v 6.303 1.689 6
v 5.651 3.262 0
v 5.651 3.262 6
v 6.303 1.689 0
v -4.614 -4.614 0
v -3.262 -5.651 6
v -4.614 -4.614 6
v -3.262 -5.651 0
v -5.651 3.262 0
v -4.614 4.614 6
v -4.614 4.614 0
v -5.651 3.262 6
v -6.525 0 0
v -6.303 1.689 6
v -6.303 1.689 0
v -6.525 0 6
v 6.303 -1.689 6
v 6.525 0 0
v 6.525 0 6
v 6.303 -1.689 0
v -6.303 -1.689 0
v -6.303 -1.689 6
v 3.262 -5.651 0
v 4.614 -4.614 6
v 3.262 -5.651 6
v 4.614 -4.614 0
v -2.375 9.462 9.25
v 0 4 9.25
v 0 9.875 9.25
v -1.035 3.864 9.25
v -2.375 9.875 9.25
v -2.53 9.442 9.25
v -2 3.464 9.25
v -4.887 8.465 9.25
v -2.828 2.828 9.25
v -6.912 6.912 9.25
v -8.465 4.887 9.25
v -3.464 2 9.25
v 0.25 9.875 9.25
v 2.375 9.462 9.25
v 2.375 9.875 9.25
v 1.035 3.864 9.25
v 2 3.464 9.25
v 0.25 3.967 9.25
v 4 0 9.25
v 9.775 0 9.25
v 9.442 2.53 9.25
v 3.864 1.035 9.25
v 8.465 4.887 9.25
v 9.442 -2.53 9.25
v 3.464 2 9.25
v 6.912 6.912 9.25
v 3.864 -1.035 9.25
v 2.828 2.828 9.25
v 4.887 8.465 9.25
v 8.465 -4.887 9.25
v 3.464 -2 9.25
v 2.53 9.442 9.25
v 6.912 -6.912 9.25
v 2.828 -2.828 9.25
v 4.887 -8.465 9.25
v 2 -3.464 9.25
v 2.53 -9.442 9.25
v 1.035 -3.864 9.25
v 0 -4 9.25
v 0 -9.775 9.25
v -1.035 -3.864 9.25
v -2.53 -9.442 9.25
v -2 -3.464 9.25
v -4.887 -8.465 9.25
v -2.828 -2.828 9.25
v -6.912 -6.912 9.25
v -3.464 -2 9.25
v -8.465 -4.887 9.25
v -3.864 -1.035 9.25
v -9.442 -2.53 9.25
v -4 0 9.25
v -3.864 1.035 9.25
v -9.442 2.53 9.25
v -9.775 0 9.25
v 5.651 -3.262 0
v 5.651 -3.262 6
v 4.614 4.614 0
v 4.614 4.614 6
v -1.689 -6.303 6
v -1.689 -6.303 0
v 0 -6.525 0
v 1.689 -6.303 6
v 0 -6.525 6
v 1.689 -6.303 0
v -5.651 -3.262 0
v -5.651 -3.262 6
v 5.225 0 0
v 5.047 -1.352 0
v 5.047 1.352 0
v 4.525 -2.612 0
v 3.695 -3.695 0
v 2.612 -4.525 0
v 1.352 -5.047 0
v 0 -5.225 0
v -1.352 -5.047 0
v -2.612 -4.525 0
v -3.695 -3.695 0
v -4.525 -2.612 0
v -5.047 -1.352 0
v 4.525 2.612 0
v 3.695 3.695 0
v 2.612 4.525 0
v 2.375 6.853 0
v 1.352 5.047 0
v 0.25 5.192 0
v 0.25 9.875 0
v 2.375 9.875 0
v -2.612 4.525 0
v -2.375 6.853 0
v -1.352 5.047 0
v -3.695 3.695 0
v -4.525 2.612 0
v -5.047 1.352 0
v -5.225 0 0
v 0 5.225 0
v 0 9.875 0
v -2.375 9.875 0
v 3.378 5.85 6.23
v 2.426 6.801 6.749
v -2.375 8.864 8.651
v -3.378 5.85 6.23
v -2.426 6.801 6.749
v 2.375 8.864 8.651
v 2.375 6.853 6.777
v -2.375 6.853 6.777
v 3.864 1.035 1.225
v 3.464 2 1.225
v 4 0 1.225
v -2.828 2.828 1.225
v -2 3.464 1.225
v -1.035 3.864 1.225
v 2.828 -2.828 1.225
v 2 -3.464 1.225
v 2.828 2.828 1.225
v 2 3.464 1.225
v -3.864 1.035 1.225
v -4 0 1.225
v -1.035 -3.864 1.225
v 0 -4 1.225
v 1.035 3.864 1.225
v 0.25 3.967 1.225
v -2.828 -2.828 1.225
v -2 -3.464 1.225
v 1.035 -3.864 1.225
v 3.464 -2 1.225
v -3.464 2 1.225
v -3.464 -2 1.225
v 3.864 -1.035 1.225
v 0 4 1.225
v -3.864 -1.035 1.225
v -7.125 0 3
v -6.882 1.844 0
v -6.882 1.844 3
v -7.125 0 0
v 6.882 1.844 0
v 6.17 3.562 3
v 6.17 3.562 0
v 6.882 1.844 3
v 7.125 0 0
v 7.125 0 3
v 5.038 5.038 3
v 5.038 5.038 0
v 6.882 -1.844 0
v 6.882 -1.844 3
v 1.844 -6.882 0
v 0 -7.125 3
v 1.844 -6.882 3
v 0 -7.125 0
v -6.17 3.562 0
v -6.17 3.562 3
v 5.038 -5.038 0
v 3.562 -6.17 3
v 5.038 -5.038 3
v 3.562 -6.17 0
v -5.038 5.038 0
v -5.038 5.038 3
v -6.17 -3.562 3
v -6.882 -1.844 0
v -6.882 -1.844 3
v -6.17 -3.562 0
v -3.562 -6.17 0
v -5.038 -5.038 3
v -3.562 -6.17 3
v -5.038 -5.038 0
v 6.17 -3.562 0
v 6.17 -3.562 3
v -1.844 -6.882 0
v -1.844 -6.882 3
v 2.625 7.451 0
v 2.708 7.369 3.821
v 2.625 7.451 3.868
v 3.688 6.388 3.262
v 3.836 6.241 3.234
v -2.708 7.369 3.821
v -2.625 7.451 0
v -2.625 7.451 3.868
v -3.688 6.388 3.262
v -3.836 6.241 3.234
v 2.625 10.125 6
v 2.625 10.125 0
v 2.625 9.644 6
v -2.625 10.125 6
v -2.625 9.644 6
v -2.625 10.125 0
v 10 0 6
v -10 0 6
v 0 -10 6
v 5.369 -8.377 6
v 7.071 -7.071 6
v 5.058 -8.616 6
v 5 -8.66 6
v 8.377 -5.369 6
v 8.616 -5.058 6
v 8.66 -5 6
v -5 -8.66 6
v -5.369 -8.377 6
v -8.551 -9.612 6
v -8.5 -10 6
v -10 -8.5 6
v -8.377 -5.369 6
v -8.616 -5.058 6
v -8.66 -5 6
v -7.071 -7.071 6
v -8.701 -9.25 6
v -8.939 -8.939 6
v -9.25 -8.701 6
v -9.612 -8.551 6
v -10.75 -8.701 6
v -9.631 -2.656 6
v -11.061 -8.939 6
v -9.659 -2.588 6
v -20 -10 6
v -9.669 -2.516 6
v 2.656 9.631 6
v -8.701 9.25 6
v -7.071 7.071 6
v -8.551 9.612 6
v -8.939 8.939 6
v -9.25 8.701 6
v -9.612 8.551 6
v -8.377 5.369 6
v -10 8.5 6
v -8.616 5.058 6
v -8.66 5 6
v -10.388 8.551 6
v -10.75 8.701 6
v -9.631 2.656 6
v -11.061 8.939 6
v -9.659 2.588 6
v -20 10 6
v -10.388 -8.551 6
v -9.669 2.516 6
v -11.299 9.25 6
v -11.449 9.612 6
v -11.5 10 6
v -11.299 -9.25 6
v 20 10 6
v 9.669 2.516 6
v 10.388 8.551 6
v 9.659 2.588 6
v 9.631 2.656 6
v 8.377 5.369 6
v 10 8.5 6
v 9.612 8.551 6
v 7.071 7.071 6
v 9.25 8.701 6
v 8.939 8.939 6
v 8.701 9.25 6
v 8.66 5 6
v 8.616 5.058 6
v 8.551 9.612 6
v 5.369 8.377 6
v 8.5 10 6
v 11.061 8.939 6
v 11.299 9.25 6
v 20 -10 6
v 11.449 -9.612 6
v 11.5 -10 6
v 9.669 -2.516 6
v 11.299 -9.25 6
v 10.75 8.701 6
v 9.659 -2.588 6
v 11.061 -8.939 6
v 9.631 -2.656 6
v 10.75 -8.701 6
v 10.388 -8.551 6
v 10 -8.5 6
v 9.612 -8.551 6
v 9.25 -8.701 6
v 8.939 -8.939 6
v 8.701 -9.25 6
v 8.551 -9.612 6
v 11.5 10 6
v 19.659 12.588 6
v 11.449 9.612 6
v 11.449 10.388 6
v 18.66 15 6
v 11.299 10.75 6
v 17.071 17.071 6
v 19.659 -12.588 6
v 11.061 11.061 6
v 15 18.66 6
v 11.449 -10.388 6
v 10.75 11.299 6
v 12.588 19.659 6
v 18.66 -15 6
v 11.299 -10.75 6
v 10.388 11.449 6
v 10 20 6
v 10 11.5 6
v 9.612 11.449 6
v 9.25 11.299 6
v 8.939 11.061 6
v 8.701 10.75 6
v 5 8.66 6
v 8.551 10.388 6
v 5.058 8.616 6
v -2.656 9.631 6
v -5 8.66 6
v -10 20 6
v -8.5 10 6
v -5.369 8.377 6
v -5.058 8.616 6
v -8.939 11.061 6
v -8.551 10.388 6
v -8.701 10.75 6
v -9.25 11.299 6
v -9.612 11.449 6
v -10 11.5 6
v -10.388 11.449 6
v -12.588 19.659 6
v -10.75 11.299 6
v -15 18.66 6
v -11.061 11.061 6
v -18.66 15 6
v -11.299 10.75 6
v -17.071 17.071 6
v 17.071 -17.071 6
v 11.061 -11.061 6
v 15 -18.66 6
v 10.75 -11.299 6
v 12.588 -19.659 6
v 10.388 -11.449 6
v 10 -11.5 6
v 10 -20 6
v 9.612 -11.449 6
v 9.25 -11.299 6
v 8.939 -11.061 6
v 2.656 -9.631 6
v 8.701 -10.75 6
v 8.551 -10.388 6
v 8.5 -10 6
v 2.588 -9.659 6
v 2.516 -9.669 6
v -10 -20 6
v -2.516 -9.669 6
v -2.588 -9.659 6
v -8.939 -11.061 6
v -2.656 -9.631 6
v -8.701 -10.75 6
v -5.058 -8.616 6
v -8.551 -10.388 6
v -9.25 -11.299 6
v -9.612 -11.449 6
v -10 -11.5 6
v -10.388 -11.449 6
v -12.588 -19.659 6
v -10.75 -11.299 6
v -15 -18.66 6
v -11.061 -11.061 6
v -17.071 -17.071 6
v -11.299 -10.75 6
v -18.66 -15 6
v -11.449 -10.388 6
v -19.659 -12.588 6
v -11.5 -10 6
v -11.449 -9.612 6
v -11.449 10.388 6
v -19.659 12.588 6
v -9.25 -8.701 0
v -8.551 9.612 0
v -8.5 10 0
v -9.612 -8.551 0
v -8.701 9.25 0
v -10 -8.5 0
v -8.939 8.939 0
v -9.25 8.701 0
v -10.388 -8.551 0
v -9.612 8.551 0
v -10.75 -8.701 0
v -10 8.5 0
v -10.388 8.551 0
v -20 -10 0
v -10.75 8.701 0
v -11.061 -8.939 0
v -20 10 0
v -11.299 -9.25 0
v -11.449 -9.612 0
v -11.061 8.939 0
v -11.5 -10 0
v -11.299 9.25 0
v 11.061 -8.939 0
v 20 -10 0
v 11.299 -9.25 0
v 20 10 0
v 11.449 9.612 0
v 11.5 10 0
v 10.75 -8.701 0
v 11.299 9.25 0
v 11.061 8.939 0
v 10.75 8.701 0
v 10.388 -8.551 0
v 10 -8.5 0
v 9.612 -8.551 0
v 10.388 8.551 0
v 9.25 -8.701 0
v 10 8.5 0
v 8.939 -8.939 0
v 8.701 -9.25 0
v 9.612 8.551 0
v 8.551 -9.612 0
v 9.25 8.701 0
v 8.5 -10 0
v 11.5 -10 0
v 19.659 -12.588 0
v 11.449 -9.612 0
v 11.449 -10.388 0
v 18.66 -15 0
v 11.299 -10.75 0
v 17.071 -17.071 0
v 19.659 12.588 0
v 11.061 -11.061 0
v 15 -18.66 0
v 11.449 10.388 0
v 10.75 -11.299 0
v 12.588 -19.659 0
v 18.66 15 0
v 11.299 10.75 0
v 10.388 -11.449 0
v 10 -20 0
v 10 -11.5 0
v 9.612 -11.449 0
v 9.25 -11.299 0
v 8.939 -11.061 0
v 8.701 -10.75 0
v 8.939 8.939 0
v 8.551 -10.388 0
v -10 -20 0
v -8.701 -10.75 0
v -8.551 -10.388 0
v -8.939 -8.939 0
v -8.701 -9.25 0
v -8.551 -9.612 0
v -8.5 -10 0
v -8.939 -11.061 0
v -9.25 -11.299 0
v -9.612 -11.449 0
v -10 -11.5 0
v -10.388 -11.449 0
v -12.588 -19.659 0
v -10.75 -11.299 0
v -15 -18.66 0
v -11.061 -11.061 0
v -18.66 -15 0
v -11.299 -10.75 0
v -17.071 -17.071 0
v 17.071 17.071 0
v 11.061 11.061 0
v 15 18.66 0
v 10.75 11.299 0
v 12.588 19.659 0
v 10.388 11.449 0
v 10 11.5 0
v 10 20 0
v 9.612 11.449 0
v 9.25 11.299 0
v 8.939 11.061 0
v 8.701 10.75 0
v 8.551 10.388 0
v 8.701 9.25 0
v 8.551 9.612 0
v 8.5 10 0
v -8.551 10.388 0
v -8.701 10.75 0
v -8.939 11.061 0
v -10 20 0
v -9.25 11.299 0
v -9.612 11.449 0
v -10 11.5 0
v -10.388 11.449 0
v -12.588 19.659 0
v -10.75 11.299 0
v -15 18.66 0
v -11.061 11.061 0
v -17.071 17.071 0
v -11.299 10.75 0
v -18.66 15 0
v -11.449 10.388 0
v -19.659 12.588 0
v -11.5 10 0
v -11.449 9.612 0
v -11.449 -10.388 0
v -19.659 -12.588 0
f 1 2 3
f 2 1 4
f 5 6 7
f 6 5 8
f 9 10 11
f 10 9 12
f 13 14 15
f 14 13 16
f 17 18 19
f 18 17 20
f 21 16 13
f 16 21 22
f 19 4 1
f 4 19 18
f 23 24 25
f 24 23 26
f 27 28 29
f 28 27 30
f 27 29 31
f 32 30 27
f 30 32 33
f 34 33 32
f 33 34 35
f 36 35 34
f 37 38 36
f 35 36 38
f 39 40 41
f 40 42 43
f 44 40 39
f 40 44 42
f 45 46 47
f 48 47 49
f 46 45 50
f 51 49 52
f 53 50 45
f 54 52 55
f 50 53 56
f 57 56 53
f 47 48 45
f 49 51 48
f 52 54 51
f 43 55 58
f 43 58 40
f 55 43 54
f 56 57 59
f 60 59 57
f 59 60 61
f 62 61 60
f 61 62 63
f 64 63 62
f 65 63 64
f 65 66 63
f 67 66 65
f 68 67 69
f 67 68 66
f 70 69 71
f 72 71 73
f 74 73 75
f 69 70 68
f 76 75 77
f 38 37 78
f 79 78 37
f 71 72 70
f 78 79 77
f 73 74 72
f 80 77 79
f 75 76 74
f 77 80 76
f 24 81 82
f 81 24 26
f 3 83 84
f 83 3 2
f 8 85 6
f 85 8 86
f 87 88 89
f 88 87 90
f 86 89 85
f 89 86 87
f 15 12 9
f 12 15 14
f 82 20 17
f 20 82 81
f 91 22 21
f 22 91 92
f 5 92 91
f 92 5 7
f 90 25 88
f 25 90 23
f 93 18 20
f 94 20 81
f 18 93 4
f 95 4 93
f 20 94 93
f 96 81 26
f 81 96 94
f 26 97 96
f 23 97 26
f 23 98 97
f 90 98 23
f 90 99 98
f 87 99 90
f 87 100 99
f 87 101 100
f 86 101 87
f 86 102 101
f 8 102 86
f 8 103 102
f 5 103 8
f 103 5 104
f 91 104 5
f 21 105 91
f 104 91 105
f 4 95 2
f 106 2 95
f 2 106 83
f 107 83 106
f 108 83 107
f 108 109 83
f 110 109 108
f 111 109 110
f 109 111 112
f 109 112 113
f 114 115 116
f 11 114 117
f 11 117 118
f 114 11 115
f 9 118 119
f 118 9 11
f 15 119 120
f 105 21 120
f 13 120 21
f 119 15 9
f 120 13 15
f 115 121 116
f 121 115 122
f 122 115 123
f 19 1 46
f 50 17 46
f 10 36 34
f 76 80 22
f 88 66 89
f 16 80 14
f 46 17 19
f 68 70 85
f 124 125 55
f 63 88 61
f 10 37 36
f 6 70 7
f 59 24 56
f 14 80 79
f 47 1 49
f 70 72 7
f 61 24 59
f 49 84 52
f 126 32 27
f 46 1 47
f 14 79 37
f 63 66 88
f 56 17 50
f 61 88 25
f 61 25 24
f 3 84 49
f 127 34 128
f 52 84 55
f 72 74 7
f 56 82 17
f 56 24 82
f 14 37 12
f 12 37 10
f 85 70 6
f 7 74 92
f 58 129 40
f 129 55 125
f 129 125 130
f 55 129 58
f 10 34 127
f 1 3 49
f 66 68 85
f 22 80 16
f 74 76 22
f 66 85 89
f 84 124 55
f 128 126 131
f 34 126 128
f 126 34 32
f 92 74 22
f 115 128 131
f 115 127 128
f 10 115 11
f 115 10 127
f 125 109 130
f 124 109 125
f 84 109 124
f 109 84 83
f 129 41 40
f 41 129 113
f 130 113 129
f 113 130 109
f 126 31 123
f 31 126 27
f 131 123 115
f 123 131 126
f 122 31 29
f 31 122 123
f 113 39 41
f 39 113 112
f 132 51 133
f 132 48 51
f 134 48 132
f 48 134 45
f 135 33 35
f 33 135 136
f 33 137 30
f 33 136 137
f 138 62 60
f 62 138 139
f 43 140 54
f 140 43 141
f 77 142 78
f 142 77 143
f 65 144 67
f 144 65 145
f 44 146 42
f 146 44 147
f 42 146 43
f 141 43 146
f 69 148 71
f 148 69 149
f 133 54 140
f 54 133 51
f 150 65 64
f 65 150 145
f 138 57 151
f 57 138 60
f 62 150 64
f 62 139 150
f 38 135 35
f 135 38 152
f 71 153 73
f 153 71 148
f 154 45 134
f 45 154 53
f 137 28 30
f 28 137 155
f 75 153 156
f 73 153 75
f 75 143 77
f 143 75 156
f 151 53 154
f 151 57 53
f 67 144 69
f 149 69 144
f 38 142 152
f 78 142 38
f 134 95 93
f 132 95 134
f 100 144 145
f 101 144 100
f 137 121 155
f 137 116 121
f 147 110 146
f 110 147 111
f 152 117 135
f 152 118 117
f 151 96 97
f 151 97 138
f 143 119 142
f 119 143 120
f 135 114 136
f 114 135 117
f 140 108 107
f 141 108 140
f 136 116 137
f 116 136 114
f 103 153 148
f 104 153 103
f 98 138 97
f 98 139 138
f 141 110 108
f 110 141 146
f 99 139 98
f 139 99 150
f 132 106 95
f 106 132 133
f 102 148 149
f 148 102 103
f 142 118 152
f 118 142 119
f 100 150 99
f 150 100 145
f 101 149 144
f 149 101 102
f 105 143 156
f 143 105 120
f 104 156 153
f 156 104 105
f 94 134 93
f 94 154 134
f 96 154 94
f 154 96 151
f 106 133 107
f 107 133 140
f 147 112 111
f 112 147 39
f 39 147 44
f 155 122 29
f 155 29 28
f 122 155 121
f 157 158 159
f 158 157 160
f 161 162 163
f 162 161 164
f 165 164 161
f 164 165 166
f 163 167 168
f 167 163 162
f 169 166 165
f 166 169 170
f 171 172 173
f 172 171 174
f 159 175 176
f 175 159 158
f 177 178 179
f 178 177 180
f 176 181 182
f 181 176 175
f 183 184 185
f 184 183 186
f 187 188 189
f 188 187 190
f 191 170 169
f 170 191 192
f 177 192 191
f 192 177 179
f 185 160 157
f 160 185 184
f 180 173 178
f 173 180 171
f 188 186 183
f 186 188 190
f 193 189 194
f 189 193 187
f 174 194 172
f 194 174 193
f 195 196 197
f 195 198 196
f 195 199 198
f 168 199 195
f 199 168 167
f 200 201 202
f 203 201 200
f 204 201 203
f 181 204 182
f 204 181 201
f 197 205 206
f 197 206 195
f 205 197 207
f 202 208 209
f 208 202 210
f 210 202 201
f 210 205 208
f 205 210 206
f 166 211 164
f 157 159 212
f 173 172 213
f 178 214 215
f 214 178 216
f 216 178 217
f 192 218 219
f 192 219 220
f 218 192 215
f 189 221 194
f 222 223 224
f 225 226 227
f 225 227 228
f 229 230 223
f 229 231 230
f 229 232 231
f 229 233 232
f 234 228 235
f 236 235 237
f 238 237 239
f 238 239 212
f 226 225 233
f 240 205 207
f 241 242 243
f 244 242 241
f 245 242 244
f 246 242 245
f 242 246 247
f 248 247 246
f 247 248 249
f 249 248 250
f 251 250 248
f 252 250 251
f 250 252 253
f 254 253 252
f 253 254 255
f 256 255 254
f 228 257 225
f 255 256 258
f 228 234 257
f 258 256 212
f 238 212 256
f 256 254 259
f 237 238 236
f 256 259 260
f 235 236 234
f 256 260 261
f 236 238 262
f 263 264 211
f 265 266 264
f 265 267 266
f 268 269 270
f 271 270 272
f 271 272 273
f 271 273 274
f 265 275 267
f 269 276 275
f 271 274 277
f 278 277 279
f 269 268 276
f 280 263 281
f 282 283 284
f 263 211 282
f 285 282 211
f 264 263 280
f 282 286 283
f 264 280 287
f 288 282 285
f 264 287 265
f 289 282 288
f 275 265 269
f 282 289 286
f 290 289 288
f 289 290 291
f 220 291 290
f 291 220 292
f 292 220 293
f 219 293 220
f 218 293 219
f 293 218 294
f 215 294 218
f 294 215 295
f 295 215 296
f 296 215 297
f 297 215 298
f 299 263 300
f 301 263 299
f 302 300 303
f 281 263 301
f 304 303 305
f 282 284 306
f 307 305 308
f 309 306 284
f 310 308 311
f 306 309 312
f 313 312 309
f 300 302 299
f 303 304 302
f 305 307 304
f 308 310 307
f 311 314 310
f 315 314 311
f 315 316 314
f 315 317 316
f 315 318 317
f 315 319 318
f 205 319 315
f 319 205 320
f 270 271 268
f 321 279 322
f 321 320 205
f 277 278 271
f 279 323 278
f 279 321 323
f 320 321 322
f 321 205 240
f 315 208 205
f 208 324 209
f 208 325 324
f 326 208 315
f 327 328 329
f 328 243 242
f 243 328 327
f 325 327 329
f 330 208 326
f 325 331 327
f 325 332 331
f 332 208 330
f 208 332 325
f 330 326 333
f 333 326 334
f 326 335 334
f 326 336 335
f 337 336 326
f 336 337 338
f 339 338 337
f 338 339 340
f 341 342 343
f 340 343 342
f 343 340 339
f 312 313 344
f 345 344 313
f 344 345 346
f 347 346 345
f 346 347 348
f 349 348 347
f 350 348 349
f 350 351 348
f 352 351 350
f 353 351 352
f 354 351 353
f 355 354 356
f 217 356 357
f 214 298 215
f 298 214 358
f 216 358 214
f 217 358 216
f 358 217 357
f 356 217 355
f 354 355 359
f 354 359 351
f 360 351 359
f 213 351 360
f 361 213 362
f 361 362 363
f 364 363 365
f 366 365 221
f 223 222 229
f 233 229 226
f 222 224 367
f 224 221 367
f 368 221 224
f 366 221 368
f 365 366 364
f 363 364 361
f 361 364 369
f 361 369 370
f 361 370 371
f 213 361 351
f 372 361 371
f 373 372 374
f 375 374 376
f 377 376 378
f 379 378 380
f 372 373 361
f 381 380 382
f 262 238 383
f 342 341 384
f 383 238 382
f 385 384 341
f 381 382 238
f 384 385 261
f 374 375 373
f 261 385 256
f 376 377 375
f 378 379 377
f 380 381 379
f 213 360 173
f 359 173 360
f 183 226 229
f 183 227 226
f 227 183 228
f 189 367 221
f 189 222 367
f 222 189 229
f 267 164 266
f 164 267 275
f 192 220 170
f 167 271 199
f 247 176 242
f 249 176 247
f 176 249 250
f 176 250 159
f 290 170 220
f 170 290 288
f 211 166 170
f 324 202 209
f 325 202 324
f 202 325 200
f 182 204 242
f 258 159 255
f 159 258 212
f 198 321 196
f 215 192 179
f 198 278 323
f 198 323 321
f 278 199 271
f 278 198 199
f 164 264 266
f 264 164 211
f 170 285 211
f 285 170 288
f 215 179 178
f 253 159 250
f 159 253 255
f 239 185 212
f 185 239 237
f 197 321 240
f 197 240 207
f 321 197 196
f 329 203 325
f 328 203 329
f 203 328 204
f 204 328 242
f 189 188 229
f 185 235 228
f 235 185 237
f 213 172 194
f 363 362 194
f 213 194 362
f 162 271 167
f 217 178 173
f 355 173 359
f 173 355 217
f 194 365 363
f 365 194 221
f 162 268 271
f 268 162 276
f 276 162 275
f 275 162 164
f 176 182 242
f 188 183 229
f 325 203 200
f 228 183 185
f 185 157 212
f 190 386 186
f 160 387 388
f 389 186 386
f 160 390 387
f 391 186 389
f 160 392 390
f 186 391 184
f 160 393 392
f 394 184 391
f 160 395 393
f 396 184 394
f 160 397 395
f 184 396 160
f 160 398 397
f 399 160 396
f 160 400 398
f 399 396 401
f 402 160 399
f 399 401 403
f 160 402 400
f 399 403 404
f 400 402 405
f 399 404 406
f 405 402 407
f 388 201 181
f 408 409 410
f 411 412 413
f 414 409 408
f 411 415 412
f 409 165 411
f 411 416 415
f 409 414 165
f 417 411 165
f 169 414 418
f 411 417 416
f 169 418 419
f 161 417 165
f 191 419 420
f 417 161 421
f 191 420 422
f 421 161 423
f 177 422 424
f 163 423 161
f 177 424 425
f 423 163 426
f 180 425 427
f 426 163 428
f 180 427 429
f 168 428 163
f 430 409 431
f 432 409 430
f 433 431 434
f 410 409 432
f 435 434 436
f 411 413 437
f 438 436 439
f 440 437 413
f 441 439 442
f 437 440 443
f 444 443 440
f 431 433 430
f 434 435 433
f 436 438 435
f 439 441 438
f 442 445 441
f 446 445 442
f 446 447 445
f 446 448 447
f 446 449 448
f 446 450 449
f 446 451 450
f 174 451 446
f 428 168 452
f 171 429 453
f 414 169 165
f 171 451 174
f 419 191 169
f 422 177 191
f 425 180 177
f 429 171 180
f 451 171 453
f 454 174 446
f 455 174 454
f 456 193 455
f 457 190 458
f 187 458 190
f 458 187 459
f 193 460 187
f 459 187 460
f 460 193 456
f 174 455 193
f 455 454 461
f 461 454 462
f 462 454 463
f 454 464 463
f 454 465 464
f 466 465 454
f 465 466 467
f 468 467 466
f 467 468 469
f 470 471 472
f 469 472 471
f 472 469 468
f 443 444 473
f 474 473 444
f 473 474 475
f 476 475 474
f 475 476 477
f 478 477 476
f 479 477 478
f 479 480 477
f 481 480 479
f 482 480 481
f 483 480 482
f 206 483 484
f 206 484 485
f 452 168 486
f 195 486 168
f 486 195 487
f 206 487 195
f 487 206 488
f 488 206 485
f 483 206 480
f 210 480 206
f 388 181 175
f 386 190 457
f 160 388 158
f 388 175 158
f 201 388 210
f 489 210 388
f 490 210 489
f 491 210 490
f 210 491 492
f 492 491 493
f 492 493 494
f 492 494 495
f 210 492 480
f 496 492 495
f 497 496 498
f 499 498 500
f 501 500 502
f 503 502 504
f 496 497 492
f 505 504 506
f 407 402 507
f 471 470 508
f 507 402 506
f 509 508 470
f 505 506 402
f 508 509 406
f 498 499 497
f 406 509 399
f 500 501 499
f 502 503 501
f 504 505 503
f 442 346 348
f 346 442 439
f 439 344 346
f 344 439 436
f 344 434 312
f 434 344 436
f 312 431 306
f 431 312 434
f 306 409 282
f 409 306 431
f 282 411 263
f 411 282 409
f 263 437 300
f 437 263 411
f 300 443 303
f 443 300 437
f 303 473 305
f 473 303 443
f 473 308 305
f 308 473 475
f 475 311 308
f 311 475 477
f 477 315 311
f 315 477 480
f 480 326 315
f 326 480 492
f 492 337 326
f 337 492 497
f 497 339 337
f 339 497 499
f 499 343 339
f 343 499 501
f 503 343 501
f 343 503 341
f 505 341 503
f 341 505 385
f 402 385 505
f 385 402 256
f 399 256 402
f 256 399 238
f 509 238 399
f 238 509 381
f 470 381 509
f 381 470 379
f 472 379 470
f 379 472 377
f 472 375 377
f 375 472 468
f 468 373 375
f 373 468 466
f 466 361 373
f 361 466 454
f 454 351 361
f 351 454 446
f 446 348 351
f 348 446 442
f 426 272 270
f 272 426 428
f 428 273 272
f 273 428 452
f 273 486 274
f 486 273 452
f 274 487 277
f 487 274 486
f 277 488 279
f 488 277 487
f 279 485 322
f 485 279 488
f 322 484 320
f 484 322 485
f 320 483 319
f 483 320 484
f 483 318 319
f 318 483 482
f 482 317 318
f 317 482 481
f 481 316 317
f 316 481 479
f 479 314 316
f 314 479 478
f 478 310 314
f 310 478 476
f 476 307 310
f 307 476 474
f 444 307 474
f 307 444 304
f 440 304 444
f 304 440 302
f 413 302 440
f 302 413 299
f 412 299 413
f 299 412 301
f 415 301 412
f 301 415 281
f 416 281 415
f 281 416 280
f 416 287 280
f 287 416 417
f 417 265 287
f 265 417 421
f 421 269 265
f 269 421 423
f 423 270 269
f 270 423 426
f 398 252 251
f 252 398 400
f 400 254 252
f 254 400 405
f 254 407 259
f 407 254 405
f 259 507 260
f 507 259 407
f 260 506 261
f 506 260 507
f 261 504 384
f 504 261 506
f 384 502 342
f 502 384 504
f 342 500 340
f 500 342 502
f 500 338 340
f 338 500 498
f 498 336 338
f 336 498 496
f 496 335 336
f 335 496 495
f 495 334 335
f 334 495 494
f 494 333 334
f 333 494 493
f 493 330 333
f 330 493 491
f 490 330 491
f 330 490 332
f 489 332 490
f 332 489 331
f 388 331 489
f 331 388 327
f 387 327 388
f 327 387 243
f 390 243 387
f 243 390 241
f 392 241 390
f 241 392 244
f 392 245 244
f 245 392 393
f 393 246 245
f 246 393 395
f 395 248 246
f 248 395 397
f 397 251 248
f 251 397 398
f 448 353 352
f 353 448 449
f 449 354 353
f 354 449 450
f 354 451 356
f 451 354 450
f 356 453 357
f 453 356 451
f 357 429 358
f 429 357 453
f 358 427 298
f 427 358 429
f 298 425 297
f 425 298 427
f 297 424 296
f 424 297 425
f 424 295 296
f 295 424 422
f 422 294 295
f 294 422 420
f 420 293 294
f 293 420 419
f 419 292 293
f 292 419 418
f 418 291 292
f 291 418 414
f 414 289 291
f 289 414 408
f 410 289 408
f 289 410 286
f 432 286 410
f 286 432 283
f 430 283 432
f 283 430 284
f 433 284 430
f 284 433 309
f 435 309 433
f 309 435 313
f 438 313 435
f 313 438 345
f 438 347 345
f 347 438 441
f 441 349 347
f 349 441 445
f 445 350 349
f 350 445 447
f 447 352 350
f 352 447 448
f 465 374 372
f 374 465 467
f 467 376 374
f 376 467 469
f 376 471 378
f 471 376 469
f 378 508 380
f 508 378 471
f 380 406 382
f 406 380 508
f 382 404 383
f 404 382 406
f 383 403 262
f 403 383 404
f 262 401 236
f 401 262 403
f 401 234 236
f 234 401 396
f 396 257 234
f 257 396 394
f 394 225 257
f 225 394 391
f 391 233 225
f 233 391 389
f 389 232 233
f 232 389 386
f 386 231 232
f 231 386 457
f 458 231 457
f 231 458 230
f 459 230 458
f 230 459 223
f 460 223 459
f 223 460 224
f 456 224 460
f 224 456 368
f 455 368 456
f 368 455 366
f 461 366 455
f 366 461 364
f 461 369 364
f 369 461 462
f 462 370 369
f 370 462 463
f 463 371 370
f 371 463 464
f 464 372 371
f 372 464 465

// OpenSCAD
// Rod Clamp
// - to replace MakerBot Rod Cover
// GPL license to match MakerBot and RepRap projects
// By Andrew Plumb

$fa=15;
$fs=0.1;
debug=0;

// render_part=1; // rod_cover_2D
// render_part=2; // rod_cover_3D
// render_part=3; // rod_clamp_outer
// render_part=4; // rod_clamp_inner
 render_part=5; // rod_clamp


module rod_cover_2D() {
  difference () {
   union () {
    translate([10,10]) circle(r=10);
    translate([10,-10]) circle(r=10);
    translate([-10,-10]) circle(r=10);
    translate([-10,10]) circle(r=10);
    translate([10,0]) square(size=20,center=true);
    translate([-10,0]) square(size=20,center=true);
    translate([0,10]) square(size=20,center=true);
    translate([0,-10]) square(size=20,center=true);
   }
    translate([10,10]) circle(r=3.0/2);
    translate([10,-10]) circle(r=3.0/2);
    translate([-10,-10]) circle(r=3.0/2);
    translate([-10,10]) circle(r=3.0/2);
  }
}

module rod_cover_3D(
  h=4.0
  ) {
  linear_extrude(
	height=h
	, center=false
	, convexity=10
  ) rod_cover_2D();
}

module rod_clamp_outer(
  oh=6.0 // Outer height/thickness of clamp
  , ih=3.0 // Inner height of clamp pass-through
  , id=6.0 // Inner Diameter (rod diameter)
  , od=8.0 // Outer Diameter (clamp diameter)
  , gap_clamp=0.5 // Gap between clamp and bracket
  ) {
  if(debug==1) {
    cylinder(r=od/2,h=ih,center=false);
  }
  difference () {
    rod_cover_3D(
	h=oh
	);
    union () {
	translate([0,0,ih])
	 cylinder(r2=od/2+(oh-ih)
	  , r1=od/2+gap_clamp/2
	  , h=oh-ih
	  , center=false
	 );
	translate([0,0,-0.1]) {
	  cylinder(h=2*0.1+oh
		, r=od/2+gap_clamp/2 );

	 rotate([0,0,45])
	  scale([od/2+gap_clamp/2,od/2+gap_clamp/2,od/2+2*0.1+ih/4])
		cube(size=1.0,center=false);
	 translate([-2.5-gap_clamp/2,0,0])
	  scale([5.0+gap_clamp,10.0+gap_clamp/2,od/2+2*0.1+ih/4])
		cube(size=1.0,center=false);
	}
	translate([0,0,ih])
	  cylinder( r1=od/2
		, r2=od/2+(oh-ih)+gap_clamp/2
		, h=oh-ih+gap_clamp/2
		, center=false);
    }
  }
}

module rod_clamp_inner(
  oh=6.0 // Outer height/thickness of clamp
  , ih=3.0 // Inner height of clamp pass-through
  , id=6.0 // Inner Diameter (rod diameter)
  , od=8.0 // Outer Diameter (clamp diameter)
  , gap_clamp=0.5 // Gap between clamp and bracket
  ) {
 difference () {
  union () {
   cylinder(h=oh+ih+gap_clamp
	, r=od/2-gap_clamp/2
	, center=false
	);
   translate([0,0,oh])
	cylinder(r1=od/2-gap_clamp/2
	  , r2=od/2+ih+gap_clamp/2
	  , h=ih+gap_clamp
	  , center=false
	);
   rotate([0,0,45])
	scale([od/2-gap_clamp/2,od/2-gap_clamp/2,ih+oh+gap_clamp])
	  cube(size=1.0,center=false);
   translate([-2.5+gap_clamp/2,0,0])
	scale([5.0-gap_clamp,10.0-gap_clamp/2,ih+oh+gap_clamp])
	  cube(size=1.0,center=false);
  }
  union () {
   translate([0,0,-0.1]) {
	cylinder(h=2*0.1+oh+ih+gap_clamp
	  , r=id/2
	  , center=false);
	cylinder(r2=0
	  , r1=id/2+(od-id)/4
	  , h=id/2+(od-id)/4
	  , center=false
	);
   }
   translate([0,0,-0.1]) {
	scale([gap_clamp,2*od,od]) cube(size=1.0,center=false);
   }
  }
 }
}

module rod_clamp(
  oh=6.0 // Outer height/thickness of clamp
  , ih=3.0 // Inner height of clamp pass-through
  , id=6.0 // Inner Diameter (rod diameter)
  , od=8.0 // Outer Diameter (clamp diameter)
  , gap_clamp=0.5 // Gap between clamp and bracket
  ) {
  rod_clamp_inner(
	oh=oh
	, ih=ih
	, id=id
	, od=od-0.05*od
	, gap_clamp=gap_clamp
	);
  rod_clamp_outer(
	oh=oh
	, ih=ih
	, id=id
	, od=od
	, gap_clamp=gap_clamp
	);
}


if(render_part==1) {
  echo("Rendering rod_cover_2D...");
  rod_cover_2D();
}

if(render_part==2) {
  echo("Rendering rod_cover_3D...");
  rod_cover_3D();
}

if(render_part==3) {
  echo("Rendering rod_clamp_outer...");
  rod_clamp_outer(
	id=8.0
	, od=11.0);
}

if(render_part==4) {
  echo("Rendering rod_clamp_inner...");
  rod_clamp_inner(
	id=8.0
	, od=11.0);
}

if(render_part==5) {
  echo("Rendering rod_clamp...");
  rod_clamp(
	id=8.0
	, od=14.0
	, gap_clamp=0.25);
}
